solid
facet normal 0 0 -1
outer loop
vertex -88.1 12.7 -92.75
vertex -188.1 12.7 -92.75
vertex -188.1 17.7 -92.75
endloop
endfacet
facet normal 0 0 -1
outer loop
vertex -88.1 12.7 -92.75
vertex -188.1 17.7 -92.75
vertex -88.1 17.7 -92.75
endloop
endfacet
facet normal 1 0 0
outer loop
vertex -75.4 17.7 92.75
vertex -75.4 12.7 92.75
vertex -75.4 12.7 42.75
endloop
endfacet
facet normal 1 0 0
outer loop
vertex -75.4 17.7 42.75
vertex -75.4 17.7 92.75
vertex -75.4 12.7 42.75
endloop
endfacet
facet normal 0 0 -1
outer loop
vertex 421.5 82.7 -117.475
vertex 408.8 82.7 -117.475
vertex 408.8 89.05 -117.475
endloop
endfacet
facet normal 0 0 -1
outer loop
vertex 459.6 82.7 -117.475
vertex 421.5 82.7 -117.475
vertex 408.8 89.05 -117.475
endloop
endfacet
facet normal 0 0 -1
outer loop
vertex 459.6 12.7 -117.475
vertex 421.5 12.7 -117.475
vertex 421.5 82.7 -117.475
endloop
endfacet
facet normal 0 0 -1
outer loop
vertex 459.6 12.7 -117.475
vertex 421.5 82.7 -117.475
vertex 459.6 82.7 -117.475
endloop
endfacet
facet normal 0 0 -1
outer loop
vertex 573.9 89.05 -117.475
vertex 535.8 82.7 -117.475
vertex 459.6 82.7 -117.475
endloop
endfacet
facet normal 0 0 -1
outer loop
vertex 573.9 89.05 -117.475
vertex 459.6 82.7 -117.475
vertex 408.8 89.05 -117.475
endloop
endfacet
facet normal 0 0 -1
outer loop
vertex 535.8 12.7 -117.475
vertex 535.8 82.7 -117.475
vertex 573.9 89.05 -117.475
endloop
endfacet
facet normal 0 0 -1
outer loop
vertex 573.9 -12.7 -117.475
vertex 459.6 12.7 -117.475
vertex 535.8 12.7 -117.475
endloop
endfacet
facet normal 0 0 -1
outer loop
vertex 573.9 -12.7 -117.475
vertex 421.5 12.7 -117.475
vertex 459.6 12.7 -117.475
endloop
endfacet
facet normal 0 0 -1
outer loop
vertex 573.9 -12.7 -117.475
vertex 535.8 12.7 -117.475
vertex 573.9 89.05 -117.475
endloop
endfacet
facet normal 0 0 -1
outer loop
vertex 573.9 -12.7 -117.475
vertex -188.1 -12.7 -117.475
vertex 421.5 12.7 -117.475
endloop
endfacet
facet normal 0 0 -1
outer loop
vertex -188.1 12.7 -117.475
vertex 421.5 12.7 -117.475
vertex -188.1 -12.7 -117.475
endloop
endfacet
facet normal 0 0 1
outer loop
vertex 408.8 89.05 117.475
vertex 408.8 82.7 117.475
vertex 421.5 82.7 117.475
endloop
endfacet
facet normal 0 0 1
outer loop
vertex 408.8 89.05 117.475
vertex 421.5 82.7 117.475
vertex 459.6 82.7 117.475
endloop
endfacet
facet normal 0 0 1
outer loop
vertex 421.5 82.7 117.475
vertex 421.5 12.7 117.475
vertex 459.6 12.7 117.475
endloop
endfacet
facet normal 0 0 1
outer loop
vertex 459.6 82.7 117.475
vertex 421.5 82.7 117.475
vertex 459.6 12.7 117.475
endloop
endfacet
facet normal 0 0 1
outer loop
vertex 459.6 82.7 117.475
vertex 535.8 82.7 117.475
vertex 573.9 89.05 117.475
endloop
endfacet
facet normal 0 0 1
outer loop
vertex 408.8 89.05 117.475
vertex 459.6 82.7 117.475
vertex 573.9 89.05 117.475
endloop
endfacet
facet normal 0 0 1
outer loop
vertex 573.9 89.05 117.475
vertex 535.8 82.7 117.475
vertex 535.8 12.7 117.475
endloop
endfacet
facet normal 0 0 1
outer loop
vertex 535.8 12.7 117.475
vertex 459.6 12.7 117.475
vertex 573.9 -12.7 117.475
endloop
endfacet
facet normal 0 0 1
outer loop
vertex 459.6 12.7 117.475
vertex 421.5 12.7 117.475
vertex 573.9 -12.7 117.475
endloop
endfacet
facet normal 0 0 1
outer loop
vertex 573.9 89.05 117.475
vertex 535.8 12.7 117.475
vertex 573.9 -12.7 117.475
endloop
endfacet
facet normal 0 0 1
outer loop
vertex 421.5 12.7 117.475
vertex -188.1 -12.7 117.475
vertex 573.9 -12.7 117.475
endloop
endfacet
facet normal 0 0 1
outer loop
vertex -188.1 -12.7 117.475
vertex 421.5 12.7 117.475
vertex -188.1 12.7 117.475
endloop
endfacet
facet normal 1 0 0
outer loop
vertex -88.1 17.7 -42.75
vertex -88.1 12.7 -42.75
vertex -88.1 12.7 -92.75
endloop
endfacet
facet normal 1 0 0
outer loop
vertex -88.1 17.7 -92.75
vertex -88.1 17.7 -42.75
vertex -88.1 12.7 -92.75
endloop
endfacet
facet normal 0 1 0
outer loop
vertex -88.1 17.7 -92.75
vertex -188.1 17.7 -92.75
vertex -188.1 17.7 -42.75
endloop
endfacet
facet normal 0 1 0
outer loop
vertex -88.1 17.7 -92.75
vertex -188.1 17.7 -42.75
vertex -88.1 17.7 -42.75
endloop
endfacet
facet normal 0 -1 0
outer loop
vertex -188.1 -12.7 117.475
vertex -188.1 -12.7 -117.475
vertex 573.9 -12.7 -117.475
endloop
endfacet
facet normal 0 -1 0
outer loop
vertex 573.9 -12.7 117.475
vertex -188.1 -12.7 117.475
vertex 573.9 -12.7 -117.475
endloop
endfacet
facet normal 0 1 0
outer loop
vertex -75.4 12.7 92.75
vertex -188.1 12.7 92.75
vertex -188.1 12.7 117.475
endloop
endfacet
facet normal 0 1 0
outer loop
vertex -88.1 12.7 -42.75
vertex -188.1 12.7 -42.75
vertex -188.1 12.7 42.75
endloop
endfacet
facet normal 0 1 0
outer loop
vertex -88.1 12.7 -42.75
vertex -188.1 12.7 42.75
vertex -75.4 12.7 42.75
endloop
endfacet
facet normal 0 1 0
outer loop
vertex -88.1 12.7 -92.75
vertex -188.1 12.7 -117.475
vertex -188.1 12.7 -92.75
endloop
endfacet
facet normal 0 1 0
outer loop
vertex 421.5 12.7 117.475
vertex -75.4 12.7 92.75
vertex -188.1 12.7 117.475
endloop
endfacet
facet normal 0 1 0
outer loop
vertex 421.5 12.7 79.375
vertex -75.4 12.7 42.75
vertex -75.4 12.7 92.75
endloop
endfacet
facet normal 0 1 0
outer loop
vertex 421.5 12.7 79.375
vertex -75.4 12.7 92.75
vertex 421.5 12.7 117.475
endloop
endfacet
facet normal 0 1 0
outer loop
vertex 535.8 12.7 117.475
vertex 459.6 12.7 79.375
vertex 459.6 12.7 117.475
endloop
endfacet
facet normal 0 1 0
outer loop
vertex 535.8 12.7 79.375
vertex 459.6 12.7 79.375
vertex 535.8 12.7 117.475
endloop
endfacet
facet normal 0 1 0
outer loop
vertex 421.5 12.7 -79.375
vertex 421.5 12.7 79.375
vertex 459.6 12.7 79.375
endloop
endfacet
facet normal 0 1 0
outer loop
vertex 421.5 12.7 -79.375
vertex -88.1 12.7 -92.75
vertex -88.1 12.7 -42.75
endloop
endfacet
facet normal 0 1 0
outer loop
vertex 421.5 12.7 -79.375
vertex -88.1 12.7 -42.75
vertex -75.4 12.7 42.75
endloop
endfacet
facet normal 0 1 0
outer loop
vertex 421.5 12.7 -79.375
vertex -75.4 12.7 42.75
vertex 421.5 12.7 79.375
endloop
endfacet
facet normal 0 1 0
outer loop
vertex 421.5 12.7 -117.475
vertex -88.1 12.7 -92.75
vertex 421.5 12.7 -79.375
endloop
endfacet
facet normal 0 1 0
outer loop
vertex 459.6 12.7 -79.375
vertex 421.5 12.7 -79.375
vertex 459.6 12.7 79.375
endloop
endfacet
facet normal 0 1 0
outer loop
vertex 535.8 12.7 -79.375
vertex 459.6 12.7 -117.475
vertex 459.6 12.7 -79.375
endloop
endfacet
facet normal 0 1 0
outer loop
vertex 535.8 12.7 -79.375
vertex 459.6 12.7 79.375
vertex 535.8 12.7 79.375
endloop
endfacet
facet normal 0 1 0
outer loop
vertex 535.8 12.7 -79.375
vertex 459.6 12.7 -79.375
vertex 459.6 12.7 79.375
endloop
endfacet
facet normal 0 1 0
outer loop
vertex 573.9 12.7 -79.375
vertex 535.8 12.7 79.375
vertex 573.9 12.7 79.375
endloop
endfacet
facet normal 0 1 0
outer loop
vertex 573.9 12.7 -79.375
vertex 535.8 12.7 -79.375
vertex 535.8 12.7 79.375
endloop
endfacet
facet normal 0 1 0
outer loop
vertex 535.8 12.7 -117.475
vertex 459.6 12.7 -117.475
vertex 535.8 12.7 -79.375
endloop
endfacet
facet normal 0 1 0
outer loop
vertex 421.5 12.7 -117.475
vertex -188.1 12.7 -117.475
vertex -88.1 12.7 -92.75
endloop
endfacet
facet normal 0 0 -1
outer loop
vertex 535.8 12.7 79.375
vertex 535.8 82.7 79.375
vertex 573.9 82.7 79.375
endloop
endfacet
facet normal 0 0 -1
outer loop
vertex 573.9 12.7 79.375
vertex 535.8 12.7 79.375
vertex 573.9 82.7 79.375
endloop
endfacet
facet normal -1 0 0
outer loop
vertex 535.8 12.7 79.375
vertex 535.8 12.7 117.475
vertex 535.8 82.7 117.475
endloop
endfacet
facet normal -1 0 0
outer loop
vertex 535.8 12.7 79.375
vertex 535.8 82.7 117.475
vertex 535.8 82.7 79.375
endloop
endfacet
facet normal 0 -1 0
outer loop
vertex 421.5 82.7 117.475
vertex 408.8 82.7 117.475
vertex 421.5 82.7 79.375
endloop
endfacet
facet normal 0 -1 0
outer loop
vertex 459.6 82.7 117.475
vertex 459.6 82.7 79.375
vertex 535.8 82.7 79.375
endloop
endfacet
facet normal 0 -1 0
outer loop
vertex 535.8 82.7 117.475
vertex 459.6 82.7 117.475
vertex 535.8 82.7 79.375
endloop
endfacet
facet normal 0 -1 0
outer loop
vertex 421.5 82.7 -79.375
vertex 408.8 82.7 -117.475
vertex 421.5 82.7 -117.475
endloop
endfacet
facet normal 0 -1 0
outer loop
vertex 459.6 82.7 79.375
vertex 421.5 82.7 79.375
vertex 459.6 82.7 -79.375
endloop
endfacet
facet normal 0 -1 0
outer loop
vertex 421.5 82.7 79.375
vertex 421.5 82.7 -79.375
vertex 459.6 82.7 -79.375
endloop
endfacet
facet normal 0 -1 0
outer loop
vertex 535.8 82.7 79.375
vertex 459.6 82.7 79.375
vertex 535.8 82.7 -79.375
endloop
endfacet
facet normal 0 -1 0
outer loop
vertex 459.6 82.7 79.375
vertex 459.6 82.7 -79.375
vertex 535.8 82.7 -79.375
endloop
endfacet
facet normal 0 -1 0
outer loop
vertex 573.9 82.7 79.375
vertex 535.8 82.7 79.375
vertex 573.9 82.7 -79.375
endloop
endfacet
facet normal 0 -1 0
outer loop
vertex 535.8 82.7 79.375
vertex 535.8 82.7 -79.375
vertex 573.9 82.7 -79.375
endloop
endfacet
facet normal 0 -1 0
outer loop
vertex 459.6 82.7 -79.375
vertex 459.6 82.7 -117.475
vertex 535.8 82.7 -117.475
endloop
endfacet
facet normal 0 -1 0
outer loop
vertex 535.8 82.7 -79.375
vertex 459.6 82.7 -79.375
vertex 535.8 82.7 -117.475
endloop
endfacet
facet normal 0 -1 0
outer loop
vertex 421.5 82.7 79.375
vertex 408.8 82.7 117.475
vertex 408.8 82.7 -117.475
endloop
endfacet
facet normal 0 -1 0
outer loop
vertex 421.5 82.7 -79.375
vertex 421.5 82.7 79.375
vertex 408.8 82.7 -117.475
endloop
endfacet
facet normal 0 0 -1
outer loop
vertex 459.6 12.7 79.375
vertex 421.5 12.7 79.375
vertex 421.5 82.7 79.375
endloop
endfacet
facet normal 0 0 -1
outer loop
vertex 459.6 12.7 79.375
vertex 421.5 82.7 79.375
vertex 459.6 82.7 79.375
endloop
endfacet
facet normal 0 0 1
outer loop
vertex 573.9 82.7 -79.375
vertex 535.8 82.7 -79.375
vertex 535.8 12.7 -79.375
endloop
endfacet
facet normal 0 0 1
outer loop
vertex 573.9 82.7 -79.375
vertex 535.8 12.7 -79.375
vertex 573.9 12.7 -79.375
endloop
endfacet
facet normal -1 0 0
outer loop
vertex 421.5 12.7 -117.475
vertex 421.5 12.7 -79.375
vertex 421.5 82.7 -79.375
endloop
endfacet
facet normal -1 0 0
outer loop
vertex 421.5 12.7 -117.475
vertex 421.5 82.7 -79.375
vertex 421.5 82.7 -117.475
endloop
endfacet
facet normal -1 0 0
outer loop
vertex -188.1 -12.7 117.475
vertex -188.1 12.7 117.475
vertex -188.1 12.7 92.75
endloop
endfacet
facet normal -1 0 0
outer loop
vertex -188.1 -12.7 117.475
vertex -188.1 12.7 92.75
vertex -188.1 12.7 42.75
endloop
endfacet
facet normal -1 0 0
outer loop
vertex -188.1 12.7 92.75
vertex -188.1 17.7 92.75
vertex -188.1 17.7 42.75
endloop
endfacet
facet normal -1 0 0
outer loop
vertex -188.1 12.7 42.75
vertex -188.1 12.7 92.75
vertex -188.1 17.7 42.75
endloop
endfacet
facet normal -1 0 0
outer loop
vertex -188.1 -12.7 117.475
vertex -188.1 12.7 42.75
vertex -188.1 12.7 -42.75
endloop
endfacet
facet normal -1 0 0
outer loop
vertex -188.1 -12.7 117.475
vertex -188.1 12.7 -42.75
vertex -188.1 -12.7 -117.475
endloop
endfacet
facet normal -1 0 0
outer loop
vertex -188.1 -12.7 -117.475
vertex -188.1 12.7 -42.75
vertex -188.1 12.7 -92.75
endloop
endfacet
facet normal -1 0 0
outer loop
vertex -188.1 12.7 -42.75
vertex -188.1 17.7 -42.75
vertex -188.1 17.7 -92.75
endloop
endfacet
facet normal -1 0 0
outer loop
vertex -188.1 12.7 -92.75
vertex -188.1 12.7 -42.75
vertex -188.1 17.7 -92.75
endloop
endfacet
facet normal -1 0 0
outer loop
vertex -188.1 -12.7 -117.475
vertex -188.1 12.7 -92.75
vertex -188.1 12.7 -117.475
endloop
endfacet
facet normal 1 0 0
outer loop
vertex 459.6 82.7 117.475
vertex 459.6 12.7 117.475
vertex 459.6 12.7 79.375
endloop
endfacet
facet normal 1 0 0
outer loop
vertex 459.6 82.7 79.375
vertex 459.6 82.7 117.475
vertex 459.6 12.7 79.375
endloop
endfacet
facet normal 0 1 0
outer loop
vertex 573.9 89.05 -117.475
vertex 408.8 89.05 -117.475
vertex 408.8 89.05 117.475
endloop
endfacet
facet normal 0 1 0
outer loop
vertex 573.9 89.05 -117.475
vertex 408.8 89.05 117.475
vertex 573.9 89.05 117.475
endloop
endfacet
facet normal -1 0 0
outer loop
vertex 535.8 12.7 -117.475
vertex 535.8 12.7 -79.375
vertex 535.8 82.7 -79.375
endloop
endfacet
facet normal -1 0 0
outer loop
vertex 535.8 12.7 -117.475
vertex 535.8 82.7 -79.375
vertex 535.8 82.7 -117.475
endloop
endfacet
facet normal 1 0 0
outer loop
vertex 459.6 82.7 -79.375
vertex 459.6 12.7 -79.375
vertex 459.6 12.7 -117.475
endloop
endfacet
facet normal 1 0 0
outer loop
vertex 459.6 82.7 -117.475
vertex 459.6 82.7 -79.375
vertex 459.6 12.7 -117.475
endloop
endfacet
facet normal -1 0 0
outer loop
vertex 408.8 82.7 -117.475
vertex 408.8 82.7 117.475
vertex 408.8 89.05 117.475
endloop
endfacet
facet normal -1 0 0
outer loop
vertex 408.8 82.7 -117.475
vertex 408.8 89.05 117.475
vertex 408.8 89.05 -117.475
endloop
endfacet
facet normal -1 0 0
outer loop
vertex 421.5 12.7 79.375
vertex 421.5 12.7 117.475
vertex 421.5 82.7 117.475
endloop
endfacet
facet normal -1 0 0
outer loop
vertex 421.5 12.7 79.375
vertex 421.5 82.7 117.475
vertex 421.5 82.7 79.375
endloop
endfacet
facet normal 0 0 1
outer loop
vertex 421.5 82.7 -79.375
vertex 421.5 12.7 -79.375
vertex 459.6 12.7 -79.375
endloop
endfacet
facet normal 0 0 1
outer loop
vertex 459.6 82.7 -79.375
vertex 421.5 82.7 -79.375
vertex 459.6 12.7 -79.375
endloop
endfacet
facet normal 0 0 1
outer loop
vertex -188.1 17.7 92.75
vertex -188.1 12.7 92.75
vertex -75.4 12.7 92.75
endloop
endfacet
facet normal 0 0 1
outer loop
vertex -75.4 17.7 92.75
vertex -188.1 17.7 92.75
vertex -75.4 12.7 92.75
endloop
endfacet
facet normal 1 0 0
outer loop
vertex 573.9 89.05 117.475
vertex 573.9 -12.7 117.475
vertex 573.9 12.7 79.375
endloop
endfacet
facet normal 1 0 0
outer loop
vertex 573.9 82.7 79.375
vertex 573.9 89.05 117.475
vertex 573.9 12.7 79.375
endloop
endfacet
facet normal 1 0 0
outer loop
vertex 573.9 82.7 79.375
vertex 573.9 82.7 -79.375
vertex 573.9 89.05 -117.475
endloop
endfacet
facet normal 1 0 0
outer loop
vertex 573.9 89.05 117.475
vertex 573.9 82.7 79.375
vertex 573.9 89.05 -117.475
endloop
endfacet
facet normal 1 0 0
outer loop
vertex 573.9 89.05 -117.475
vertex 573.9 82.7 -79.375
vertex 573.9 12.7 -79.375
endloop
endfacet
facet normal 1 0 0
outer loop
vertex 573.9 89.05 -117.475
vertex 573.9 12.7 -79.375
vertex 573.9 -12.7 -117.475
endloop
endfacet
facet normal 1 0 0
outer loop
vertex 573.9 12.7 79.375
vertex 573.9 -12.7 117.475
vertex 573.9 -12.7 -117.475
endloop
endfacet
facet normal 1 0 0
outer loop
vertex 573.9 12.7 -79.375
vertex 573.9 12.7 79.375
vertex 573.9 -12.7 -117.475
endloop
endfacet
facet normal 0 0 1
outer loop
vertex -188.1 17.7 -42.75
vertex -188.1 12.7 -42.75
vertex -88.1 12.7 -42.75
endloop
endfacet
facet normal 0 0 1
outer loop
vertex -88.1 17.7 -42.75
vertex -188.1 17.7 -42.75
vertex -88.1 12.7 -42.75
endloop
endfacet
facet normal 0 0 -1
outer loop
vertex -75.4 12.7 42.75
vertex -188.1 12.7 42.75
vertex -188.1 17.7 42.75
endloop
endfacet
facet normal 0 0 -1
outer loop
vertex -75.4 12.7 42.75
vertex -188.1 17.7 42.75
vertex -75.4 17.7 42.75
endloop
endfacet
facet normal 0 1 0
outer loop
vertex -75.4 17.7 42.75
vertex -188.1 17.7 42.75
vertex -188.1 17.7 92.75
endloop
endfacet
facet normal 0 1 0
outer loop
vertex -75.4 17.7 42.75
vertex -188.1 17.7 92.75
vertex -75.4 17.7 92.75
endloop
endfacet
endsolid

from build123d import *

# Parameters (mm, degrees)
SKETCH1_W           = 762
SKETCH1_H           = 234.95
BOSS_EXTRUDE1_DEPTH = 12.7
SKETCH2_W           = 38.1
SKETCH2_H           = 38.1
BOSS_EXTRUDE2_DEPTH = 70
SKETCH3_W           = 165.1
SKETCH3_H           = 234.95
BOSS_EXTRUDE3_DEPTH = 6.35
SKETCH4_W           = 100
SKETCH4_H           = 50
SKETCH4_W_2         = 112.7
BOSS_EXTRUDE4_DEPTH = 5


with BuildPart() as part:
    # Sketch1 → Boss-Extrude1 (new body, symmetric)
    with BuildSketch(Plane(origin=(0, 0, 0), x_dir=(1, 0, 0), z_dir=(0, 1, 0))):
        with Locations((192.9, 0)):
            Rectangle(SKETCH1_W, SKETCH1_H)
    extrude(amount=BOSS_EXTRUDE1_DEPTH, both=True)

    # Sketch2 → Boss-Extrude2 (add)
    with BuildSketch(Plane(origin=(0, 12.7, 0), x_dir=(1, 0, 0), z_dir=(0, 1, 0))):
        with Locations((554.85, 98.425)):
            Rectangle(SKETCH2_W, SKETCH2_H)
        with Locations((554.85, -98.425)):
            Rectangle(SKETCH2_W, SKETCH2_H)
        with Locations((440.55, -98.425)):
            Rectangle(SKETCH2_W, SKETCH2_H)
        with Locations((440.55, 98.425)):
            Rectangle(SKETCH2_W, SKETCH2_H)
    extrude(amount=BOSS_EXTRUDE2_DEPTH)

    # Sketch3 → Boss-Extrude3 (add)
    with BuildSketch(Plane(origin=(0, 82.7, 0), x_dir=(1, 0, 0), z_dir=(0, 1, 0))):
        with Locations((491.35, 0)):
            Rectangle(SKETCH3_W, SKETCH3_H)
    extrude(amount=BOSS_EXTRUDE3_DEPTH)

    # Sketch4 → Boss-Extrude4 (add)
    with BuildSketch(Plane(origin=(0, 12.7, 0), x_dir=(1, 0, 0), z_dir=(0, 1, 0))):
        with Locations((-138.1, 67.75)):
            Rectangle(SKETCH4_W, SKETCH4_H)
        with Locations((-131.75, -67.75)):
            Rectangle(SKETCH4_W_2, SKETCH4_H)
    extrude(amount=BOSS_EXTRUDE4_DEPTH)


solid = part.part
